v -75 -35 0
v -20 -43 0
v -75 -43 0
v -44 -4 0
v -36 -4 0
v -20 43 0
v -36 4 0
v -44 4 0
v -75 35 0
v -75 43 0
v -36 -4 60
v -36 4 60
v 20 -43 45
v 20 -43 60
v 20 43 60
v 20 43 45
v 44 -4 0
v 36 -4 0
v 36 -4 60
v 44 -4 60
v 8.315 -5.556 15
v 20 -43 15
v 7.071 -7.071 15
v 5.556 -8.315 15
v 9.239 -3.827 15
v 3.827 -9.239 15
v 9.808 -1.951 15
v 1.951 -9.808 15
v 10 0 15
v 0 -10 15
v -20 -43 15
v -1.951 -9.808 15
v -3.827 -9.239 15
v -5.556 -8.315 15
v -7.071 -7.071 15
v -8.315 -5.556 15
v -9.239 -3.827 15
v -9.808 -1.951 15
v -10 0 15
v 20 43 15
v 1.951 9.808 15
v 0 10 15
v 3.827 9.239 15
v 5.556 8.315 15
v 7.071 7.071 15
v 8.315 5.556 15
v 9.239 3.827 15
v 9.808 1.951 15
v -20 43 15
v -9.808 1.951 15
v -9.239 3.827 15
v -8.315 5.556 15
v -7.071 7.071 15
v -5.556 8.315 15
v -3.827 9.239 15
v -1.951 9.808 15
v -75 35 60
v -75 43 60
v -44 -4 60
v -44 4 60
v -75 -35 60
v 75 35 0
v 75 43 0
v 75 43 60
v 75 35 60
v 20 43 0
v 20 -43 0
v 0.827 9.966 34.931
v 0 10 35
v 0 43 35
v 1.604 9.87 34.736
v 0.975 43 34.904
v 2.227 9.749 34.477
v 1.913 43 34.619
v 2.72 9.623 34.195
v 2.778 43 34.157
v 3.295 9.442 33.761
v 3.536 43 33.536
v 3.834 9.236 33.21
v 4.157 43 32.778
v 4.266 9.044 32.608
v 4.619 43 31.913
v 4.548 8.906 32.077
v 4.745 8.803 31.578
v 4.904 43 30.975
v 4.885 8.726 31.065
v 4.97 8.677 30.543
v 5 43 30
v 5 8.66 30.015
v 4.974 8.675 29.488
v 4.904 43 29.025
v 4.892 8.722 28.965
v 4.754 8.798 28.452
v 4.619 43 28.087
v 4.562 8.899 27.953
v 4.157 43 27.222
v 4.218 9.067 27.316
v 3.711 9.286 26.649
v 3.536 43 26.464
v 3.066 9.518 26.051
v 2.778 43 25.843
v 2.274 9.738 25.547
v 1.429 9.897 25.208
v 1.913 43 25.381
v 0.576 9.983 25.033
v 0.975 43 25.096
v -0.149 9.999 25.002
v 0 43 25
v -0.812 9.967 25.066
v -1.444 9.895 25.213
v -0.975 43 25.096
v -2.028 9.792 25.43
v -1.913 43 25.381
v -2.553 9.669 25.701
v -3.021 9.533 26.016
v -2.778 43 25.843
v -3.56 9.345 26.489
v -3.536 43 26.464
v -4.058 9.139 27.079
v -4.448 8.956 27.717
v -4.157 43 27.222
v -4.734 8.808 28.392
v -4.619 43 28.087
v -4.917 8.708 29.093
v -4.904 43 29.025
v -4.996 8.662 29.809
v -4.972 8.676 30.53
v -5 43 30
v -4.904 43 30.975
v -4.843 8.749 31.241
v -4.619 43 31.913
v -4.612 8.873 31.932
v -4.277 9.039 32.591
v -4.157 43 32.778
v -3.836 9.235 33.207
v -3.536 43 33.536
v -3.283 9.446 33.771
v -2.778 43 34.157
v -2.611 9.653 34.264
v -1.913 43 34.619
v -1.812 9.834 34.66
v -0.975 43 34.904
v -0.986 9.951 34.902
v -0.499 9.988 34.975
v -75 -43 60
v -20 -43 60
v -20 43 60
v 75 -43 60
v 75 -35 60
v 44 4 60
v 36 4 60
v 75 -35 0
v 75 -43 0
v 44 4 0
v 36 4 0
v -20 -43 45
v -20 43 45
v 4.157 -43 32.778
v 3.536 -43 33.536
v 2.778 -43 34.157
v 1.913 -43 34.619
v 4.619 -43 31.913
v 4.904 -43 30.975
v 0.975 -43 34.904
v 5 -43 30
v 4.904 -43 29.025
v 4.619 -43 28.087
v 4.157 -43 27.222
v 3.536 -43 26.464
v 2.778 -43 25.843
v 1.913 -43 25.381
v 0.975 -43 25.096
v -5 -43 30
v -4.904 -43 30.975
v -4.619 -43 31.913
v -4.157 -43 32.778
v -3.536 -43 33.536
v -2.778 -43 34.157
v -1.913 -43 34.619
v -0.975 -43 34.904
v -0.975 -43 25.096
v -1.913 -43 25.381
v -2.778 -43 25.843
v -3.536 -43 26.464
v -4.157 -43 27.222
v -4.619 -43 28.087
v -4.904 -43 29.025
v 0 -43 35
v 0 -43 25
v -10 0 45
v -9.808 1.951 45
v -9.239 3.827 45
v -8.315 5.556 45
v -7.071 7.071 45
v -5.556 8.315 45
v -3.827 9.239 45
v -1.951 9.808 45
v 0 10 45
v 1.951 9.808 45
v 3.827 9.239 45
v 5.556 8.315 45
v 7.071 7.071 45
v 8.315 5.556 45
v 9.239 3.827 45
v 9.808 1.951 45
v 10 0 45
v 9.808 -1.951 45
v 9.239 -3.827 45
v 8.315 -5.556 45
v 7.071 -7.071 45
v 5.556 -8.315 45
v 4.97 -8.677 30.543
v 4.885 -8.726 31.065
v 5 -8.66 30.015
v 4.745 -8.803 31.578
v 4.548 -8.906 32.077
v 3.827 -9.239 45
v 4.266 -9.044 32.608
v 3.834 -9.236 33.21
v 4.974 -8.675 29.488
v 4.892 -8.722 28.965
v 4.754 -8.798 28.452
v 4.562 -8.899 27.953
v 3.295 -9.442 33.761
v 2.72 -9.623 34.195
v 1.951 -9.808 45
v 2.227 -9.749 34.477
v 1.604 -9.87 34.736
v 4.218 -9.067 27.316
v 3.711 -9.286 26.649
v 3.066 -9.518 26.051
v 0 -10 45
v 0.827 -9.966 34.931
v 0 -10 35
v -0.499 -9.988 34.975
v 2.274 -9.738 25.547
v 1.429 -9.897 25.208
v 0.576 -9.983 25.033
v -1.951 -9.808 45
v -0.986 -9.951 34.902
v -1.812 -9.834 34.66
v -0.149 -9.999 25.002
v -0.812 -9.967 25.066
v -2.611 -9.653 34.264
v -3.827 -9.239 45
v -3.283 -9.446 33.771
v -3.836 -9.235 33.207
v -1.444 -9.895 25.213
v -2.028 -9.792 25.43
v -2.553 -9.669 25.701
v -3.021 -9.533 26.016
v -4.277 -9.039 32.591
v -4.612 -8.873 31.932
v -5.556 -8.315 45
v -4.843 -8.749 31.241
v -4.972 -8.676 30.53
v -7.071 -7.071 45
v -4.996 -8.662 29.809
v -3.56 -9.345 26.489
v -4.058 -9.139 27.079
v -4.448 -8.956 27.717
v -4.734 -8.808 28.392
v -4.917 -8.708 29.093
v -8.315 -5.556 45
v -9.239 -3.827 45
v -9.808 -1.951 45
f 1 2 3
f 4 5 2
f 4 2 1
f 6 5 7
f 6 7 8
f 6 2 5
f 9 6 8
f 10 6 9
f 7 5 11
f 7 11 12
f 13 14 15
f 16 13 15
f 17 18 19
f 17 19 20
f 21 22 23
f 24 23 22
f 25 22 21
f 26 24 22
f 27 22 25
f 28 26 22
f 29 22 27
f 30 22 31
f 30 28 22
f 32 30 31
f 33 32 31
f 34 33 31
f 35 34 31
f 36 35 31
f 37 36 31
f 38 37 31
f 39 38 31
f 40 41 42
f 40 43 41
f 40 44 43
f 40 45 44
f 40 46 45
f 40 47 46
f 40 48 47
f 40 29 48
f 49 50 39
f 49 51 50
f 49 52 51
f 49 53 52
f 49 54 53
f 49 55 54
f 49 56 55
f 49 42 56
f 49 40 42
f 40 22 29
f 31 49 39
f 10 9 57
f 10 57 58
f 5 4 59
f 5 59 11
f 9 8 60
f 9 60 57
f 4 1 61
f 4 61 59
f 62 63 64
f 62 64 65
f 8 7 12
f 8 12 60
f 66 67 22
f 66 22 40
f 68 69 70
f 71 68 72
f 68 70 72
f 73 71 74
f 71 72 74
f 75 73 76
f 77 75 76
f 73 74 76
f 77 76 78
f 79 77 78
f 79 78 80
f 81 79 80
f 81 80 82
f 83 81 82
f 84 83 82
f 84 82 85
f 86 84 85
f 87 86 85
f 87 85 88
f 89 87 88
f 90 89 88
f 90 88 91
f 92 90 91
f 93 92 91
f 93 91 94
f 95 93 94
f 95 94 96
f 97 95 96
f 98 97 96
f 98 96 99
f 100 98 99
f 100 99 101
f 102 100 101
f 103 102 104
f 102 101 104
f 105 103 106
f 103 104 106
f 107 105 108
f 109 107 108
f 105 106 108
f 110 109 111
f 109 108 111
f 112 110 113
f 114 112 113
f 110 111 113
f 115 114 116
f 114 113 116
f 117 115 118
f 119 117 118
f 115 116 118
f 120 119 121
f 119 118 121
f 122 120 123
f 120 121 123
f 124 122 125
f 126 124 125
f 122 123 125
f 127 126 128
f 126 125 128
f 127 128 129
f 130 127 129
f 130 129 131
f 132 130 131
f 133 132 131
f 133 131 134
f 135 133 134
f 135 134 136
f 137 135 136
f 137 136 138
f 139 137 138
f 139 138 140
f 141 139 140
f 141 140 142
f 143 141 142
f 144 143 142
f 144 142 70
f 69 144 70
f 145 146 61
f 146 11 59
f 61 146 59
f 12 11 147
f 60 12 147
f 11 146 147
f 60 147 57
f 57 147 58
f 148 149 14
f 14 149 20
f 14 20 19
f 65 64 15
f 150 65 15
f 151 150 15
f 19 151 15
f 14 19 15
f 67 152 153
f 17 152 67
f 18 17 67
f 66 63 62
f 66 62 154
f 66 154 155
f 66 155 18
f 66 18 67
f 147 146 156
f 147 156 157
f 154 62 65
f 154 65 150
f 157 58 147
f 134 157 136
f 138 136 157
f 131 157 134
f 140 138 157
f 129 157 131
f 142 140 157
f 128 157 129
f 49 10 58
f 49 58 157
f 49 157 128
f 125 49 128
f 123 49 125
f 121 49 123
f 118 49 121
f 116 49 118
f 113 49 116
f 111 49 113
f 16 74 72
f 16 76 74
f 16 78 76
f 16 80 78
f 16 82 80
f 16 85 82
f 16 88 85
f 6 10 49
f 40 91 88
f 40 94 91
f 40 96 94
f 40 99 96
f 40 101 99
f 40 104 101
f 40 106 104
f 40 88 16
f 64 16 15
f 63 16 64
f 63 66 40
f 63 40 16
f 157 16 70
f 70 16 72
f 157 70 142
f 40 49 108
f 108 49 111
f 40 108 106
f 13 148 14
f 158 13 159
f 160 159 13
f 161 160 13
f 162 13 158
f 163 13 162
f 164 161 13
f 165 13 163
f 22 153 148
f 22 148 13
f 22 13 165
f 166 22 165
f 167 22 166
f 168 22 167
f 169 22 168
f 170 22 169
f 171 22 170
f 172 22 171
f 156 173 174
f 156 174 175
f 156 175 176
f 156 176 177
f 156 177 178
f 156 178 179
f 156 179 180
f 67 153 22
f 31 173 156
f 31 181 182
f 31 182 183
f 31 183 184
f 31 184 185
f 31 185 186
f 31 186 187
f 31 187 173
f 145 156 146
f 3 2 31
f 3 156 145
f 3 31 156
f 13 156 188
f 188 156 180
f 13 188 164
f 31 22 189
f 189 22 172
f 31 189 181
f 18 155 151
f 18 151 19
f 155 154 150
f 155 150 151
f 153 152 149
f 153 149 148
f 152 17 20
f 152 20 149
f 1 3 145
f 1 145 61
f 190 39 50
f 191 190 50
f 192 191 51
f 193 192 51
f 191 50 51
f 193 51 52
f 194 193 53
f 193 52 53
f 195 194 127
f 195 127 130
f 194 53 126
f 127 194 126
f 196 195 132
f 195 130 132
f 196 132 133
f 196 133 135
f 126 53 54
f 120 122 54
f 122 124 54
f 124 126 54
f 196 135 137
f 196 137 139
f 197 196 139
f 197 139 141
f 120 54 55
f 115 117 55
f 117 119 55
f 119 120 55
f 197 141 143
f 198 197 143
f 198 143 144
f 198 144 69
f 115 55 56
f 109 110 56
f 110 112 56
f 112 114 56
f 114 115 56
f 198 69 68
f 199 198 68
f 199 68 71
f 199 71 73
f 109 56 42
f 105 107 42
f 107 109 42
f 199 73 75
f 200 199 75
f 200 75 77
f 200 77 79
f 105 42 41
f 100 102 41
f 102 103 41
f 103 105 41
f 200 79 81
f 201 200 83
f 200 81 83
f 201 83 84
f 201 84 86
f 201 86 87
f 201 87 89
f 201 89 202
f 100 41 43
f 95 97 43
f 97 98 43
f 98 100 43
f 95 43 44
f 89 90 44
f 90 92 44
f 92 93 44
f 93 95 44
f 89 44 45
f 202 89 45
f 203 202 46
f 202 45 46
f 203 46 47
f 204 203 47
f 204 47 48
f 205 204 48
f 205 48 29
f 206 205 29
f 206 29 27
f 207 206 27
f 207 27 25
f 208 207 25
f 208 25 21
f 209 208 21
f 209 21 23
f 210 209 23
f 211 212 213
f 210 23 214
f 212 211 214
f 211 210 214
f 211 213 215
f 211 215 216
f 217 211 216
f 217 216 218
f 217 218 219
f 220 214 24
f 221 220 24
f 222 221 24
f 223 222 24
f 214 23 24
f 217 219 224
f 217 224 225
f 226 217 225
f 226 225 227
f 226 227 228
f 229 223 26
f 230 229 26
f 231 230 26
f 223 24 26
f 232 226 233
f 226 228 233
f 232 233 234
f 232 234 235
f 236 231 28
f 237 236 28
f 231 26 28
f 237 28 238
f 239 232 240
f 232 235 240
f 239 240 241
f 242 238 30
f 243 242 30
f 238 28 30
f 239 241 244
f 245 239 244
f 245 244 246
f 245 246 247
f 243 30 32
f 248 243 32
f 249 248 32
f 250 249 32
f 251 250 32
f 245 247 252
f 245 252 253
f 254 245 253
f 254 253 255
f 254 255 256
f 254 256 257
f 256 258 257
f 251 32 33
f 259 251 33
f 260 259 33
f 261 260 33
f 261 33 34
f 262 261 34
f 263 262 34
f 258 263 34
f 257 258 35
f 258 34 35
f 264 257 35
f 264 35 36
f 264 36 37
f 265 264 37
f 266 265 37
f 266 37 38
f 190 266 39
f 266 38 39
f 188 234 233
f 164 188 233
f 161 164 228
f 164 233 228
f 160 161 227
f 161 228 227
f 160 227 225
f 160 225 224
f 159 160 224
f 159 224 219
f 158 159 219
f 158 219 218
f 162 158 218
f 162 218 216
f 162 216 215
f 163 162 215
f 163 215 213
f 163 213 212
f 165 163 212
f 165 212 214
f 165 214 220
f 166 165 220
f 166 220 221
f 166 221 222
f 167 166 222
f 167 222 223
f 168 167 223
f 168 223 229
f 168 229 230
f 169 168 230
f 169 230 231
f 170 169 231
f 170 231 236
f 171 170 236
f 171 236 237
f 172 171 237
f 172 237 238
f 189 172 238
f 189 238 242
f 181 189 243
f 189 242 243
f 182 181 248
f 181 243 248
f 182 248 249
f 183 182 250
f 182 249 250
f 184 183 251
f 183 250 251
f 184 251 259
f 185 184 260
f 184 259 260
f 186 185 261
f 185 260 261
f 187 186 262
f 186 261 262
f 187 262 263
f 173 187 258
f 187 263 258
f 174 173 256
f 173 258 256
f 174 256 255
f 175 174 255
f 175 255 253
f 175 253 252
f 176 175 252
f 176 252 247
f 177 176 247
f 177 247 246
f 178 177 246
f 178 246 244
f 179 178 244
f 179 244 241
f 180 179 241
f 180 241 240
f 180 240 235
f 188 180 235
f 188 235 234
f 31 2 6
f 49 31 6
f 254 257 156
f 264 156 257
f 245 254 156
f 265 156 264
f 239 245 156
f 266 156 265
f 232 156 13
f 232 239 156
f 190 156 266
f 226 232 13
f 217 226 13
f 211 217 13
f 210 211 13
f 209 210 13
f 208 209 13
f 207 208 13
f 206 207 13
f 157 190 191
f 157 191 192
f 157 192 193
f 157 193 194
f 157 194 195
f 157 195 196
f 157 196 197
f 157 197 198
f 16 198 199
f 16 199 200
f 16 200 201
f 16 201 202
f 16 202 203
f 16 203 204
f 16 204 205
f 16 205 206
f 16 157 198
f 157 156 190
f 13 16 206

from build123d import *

# Parameters (mm, degrees)
BOSS_EXTRU_1_DEPTH      = 60
ESQUISSE2_W             = 40
ESQUISSE2_H             = 86
ENL_V_MAT_EXTRU_1_DEPTH = 15
ESQUISSE3_W             = 40
ESQUISSE3_H             = 86
ENL_V_MAT_EXTRU_2_DEPTH = 15
ESQUISSE4_R             = 10
ENL_V_MAT_EXTRU_3_DEPTH = 98.462813421
ESQUISSE5_R             = 5
ENL_V_MAT_EXTRU_4_DEPTH = 129.922457314


with BuildPart() as part:
    # Esquisse1 → Boss.-Extru.1 (new body)
    with BuildSketch(Plane.XY):
        Polygon((-75, 43), (75, 43), (75, 35), (44, 4), (36, 4), (36, -4), (44, -4), (75, -35), (75, -43), (-75, -43), (-75, -35), (-44, -4), (-36, -4), (-36, 4), (-44, 4), (-75, 35), align=None)
    extrude(amount=BOSS_EXTRU_1_DEPTH)

    # Esquisse2 → Enlèv. mat.-Extru.1 (cut)
    with BuildSketch(Plane.XY.offset(60)):
        Rectangle(ESQUISSE2_W, ESQUISSE2_H)
    extrude(amount=-ENL_V_MAT_EXTRU_1_DEPTH, mode=Mode.SUBTRACT)

    # Esquisse3 → Enlèv. mat.-Extru.2 (cut)
    with BuildSketch(Plane(origin=(0, 0, 0), x_dir=(-1, 0, 0), z_dir=(0, 0, -1))):
        Rectangle(ESQUISSE3_W, ESQUISSE3_H)
    extrude(amount=-ENL_V_MAT_EXTRU_2_DEPTH, mode=Mode.SUBTRACT)

    # Esquisse4 → Enlèv. mat.-Extru.3 (cut, through all)
    with BuildSketch(Plane(origin=(0, 0, 15), x_dir=(-1, 0, 0), z_dir=(0, 0, -1))):
        Circle(ESQUISSE4_R)
    extrude(amount=-ENL_V_MAT_EXTRU_3_DEPTH, mode=Mode.SUBTRACT)

    # Esquisse5 → Enlèv. mat.-Extru.4 (cut, through all)
    with BuildSketch(Plane(origin=(0, 43, 0), x_dir=(1, 0, 0), z_dir=(0, 1, 0))):
        with Locations(Location((0, -30, 0), (0, 0, 270))):
            Circle(ESQUISSE5_R)
    extrude(amount=-ENL_V_MAT_EXTRU_4_DEPTH, mode=Mode.SUBTRACT)


solid = part.part
